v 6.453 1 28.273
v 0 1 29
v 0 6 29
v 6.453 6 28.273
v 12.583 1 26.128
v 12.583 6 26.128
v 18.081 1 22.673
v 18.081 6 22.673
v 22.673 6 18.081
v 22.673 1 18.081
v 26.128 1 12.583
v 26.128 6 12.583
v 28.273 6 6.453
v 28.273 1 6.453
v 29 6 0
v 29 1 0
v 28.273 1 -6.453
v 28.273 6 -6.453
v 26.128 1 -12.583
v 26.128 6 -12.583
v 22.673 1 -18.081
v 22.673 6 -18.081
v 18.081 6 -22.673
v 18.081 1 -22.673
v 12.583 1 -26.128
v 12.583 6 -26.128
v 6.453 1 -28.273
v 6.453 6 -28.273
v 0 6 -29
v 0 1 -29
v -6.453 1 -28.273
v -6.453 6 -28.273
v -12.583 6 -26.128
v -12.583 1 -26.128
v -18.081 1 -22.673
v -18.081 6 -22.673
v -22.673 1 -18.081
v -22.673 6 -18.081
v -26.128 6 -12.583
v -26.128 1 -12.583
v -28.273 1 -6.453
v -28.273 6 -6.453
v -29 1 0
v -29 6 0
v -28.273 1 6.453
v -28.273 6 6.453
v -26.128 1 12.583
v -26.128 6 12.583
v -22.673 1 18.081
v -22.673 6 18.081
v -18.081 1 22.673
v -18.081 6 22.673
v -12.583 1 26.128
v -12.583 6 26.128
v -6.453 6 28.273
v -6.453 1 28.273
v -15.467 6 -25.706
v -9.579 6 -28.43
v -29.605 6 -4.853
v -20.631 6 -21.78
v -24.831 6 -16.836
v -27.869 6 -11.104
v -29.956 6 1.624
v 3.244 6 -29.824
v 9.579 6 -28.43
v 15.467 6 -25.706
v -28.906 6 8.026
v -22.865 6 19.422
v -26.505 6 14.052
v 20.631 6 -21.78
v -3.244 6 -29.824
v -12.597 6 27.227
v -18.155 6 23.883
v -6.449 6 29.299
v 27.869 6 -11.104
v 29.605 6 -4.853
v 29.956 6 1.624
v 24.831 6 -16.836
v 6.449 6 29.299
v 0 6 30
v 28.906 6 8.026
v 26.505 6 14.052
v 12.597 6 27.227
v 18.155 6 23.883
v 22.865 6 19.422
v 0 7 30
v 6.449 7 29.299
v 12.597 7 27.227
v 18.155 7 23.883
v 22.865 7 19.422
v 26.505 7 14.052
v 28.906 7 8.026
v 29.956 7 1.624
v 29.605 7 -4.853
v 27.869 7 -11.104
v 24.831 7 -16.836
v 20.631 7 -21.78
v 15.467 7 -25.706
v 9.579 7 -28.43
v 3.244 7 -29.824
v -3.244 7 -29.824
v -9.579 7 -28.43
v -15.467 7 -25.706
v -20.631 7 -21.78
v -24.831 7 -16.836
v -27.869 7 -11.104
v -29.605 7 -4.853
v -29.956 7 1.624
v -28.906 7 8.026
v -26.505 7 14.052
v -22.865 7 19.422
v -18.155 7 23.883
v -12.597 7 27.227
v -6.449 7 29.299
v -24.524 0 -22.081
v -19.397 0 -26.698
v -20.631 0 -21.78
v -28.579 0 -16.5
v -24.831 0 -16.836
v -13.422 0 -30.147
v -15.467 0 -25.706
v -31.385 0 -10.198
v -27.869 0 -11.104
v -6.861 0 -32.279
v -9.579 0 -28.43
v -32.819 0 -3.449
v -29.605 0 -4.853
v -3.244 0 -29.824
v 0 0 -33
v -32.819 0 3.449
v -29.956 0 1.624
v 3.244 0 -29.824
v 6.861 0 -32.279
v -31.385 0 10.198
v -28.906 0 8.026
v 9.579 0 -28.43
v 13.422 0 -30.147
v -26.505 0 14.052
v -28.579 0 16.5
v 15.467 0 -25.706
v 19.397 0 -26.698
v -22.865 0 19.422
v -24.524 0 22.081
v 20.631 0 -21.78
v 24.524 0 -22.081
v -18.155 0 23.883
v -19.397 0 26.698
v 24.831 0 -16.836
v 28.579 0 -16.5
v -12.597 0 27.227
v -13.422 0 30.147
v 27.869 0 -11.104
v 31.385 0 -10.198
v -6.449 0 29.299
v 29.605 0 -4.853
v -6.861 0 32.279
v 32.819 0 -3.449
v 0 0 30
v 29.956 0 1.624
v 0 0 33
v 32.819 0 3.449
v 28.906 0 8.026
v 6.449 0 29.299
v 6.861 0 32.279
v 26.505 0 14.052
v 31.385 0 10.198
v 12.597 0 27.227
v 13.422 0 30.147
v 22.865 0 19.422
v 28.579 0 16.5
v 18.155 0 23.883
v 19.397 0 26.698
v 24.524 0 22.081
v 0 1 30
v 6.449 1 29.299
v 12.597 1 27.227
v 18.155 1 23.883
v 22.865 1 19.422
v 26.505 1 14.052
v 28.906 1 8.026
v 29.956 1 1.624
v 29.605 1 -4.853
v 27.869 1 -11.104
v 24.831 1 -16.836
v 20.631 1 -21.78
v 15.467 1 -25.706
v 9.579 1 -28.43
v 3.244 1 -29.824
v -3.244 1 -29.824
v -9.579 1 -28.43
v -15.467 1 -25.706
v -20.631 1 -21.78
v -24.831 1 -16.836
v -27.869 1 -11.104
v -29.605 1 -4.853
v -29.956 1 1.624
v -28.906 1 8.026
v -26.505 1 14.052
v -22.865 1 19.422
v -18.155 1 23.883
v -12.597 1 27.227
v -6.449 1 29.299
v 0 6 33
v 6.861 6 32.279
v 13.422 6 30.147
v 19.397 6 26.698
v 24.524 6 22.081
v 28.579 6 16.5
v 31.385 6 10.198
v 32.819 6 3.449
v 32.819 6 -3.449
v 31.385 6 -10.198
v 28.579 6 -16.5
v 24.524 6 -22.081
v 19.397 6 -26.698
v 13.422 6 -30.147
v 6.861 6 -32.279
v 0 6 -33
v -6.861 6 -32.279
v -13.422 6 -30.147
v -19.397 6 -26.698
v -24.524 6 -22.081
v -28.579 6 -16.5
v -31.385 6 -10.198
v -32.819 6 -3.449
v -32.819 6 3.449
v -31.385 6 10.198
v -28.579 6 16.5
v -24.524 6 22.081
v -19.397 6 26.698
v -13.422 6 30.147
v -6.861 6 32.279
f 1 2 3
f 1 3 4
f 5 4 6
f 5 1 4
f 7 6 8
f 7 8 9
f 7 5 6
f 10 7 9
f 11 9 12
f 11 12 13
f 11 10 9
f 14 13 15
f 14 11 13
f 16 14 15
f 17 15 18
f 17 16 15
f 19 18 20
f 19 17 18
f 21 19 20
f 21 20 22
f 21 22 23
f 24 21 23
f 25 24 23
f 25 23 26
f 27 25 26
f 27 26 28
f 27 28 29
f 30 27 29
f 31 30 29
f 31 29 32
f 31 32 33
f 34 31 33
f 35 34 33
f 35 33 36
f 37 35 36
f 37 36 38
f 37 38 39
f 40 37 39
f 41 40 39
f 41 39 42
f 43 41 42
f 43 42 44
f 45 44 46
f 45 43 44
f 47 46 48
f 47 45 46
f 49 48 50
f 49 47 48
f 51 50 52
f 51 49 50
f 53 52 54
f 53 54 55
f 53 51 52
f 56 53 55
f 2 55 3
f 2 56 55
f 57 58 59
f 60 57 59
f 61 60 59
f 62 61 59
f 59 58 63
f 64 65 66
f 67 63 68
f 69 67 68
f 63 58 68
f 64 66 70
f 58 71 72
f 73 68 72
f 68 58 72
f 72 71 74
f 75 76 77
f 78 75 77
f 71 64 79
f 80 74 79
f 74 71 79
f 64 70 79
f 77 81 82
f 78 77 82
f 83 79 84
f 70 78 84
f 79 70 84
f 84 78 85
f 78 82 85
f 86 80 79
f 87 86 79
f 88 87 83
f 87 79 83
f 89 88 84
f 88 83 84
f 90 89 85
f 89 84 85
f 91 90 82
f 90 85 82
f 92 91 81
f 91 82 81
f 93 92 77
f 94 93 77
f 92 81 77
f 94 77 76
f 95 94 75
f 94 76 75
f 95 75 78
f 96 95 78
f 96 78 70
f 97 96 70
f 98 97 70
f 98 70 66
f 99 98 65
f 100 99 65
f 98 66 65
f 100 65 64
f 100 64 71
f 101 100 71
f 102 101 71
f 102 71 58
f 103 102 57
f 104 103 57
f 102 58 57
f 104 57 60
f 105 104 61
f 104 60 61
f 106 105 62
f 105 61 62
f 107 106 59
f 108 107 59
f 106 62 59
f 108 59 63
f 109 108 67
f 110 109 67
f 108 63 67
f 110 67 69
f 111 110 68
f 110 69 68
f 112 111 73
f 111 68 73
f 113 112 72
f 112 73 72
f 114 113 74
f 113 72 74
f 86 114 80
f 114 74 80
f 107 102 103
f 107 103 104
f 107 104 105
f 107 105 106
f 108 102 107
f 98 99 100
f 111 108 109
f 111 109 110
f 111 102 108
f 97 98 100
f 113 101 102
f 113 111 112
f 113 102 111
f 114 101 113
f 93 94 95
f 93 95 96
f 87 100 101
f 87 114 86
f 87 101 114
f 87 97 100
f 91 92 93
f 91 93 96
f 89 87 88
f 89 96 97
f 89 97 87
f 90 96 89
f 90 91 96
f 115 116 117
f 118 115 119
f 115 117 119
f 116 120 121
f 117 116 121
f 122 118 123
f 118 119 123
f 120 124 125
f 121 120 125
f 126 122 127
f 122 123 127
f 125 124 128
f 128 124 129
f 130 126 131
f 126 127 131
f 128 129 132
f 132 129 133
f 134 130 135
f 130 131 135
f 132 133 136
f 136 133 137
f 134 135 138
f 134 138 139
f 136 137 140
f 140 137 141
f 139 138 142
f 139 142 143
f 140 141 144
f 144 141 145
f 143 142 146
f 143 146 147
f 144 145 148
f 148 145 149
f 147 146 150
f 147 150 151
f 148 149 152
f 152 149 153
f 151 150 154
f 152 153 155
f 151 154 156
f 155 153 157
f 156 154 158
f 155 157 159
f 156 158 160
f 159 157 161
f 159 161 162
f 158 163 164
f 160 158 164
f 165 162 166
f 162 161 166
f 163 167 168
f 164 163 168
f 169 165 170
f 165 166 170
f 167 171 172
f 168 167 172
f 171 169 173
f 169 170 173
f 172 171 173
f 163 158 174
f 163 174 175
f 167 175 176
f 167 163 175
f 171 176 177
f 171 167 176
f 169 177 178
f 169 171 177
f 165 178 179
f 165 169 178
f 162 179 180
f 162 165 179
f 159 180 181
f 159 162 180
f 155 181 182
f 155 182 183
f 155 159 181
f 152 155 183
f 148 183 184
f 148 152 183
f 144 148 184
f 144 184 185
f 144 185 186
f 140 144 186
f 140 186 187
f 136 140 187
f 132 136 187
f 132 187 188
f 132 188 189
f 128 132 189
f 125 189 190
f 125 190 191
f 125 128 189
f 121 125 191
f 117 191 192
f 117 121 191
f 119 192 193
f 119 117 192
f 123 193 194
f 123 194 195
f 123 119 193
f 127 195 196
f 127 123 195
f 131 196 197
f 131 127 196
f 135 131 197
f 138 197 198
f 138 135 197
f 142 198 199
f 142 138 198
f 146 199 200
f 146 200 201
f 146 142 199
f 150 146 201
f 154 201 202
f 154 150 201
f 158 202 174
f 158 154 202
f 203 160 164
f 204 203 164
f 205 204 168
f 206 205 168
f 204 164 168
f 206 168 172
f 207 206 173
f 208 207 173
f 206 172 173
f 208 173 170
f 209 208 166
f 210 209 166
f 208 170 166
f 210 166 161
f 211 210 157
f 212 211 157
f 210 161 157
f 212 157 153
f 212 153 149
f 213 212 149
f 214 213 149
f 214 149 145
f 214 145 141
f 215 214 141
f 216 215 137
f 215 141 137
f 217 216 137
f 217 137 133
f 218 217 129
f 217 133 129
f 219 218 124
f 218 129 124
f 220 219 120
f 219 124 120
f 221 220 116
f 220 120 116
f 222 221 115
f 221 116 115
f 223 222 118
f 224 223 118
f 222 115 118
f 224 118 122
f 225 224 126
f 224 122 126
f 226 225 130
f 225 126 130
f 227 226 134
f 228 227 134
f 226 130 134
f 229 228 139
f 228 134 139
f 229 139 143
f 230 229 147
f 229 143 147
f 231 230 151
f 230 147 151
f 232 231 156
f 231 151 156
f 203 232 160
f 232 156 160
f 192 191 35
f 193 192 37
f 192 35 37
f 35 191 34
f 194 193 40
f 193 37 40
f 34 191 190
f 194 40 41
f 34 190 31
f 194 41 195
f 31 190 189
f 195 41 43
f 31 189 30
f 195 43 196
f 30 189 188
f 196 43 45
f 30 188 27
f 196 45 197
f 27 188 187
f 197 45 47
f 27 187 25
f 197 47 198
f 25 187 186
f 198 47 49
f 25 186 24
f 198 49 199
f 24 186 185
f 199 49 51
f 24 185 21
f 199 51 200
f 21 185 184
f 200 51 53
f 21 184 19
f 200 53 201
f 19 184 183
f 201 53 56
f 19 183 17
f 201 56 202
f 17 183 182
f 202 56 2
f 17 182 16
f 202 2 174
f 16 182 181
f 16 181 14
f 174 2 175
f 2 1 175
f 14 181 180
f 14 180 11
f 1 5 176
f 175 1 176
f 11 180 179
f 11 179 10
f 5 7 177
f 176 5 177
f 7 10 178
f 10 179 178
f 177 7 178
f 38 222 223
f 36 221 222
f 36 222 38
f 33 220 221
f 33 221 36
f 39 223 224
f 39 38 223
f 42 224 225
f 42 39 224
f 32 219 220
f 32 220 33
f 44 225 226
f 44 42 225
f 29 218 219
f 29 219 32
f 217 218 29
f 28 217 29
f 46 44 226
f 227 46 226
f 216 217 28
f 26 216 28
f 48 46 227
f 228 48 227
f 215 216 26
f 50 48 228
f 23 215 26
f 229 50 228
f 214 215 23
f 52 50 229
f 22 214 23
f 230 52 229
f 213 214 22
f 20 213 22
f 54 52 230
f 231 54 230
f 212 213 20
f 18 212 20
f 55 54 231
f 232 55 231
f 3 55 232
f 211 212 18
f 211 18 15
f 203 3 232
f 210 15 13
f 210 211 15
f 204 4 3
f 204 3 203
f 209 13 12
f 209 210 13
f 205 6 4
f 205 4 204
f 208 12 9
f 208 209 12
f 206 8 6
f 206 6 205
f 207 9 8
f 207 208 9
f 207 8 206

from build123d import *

# Parameters (mm, degrees)
SKETCH1_R           = 33
SKETCH1_R_2         = 29
BEZEL_RING_DEPTH    = 6
SKETCH2_R           = 30
CUT_EXTRUDE1_DEPTH  = 1
SKETCH4_R           = 30
BOSS_EXTRUDE2_DEPTH = 1


with BuildPart() as part:
    # Sketch1 → BEZEL_RING (new body)
    with BuildSketch(Plane(origin=(0, 0, 0), x_dir=(1, 0, 0), z_dir=(0, 1, 0))):
        with Locations(Location((0, 0, 0), (0, 0, 270))):
            Circle(SKETCH1_R)
        with Locations(Location((0, 0, 0), (0, 0, 270))):
            Circle(SKETCH1_R_2, mode=Mode.SUBTRACT)
    extrude(amount=BEZEL_RING_DEPTH)

    # Sketch2 → Cut-Extrude1 (cut)
    with BuildSketch(Plane(origin=(0, 0, 0), x_dir=(1, 0, 0), z_dir=(0, 1, 0))):
        with Locations(Location((0, 0, 0), (0, 0, 270))):
            Circle(SKETCH2_R)
    extrude(amount=CUT_EXTRUDE1_DEPTH, mode=Mode.SUBTRACT)


with BuildPart() as body_2:
    # Sketch4 → Boss-Extrude2 (new body)
    with BuildSketch(Plane(origin=(0, 6, 0), x_dir=(1, 0, 0), z_dir=(0, 1, 0))):
        with Locations(Location((0, 0, 0), (0, 0, 270))):
            Circle(SKETCH4_R)
    extrude(amount=BOSS_EXTRUDE2_DEPTH)


solid = Compound([part.part, body_2.part])
